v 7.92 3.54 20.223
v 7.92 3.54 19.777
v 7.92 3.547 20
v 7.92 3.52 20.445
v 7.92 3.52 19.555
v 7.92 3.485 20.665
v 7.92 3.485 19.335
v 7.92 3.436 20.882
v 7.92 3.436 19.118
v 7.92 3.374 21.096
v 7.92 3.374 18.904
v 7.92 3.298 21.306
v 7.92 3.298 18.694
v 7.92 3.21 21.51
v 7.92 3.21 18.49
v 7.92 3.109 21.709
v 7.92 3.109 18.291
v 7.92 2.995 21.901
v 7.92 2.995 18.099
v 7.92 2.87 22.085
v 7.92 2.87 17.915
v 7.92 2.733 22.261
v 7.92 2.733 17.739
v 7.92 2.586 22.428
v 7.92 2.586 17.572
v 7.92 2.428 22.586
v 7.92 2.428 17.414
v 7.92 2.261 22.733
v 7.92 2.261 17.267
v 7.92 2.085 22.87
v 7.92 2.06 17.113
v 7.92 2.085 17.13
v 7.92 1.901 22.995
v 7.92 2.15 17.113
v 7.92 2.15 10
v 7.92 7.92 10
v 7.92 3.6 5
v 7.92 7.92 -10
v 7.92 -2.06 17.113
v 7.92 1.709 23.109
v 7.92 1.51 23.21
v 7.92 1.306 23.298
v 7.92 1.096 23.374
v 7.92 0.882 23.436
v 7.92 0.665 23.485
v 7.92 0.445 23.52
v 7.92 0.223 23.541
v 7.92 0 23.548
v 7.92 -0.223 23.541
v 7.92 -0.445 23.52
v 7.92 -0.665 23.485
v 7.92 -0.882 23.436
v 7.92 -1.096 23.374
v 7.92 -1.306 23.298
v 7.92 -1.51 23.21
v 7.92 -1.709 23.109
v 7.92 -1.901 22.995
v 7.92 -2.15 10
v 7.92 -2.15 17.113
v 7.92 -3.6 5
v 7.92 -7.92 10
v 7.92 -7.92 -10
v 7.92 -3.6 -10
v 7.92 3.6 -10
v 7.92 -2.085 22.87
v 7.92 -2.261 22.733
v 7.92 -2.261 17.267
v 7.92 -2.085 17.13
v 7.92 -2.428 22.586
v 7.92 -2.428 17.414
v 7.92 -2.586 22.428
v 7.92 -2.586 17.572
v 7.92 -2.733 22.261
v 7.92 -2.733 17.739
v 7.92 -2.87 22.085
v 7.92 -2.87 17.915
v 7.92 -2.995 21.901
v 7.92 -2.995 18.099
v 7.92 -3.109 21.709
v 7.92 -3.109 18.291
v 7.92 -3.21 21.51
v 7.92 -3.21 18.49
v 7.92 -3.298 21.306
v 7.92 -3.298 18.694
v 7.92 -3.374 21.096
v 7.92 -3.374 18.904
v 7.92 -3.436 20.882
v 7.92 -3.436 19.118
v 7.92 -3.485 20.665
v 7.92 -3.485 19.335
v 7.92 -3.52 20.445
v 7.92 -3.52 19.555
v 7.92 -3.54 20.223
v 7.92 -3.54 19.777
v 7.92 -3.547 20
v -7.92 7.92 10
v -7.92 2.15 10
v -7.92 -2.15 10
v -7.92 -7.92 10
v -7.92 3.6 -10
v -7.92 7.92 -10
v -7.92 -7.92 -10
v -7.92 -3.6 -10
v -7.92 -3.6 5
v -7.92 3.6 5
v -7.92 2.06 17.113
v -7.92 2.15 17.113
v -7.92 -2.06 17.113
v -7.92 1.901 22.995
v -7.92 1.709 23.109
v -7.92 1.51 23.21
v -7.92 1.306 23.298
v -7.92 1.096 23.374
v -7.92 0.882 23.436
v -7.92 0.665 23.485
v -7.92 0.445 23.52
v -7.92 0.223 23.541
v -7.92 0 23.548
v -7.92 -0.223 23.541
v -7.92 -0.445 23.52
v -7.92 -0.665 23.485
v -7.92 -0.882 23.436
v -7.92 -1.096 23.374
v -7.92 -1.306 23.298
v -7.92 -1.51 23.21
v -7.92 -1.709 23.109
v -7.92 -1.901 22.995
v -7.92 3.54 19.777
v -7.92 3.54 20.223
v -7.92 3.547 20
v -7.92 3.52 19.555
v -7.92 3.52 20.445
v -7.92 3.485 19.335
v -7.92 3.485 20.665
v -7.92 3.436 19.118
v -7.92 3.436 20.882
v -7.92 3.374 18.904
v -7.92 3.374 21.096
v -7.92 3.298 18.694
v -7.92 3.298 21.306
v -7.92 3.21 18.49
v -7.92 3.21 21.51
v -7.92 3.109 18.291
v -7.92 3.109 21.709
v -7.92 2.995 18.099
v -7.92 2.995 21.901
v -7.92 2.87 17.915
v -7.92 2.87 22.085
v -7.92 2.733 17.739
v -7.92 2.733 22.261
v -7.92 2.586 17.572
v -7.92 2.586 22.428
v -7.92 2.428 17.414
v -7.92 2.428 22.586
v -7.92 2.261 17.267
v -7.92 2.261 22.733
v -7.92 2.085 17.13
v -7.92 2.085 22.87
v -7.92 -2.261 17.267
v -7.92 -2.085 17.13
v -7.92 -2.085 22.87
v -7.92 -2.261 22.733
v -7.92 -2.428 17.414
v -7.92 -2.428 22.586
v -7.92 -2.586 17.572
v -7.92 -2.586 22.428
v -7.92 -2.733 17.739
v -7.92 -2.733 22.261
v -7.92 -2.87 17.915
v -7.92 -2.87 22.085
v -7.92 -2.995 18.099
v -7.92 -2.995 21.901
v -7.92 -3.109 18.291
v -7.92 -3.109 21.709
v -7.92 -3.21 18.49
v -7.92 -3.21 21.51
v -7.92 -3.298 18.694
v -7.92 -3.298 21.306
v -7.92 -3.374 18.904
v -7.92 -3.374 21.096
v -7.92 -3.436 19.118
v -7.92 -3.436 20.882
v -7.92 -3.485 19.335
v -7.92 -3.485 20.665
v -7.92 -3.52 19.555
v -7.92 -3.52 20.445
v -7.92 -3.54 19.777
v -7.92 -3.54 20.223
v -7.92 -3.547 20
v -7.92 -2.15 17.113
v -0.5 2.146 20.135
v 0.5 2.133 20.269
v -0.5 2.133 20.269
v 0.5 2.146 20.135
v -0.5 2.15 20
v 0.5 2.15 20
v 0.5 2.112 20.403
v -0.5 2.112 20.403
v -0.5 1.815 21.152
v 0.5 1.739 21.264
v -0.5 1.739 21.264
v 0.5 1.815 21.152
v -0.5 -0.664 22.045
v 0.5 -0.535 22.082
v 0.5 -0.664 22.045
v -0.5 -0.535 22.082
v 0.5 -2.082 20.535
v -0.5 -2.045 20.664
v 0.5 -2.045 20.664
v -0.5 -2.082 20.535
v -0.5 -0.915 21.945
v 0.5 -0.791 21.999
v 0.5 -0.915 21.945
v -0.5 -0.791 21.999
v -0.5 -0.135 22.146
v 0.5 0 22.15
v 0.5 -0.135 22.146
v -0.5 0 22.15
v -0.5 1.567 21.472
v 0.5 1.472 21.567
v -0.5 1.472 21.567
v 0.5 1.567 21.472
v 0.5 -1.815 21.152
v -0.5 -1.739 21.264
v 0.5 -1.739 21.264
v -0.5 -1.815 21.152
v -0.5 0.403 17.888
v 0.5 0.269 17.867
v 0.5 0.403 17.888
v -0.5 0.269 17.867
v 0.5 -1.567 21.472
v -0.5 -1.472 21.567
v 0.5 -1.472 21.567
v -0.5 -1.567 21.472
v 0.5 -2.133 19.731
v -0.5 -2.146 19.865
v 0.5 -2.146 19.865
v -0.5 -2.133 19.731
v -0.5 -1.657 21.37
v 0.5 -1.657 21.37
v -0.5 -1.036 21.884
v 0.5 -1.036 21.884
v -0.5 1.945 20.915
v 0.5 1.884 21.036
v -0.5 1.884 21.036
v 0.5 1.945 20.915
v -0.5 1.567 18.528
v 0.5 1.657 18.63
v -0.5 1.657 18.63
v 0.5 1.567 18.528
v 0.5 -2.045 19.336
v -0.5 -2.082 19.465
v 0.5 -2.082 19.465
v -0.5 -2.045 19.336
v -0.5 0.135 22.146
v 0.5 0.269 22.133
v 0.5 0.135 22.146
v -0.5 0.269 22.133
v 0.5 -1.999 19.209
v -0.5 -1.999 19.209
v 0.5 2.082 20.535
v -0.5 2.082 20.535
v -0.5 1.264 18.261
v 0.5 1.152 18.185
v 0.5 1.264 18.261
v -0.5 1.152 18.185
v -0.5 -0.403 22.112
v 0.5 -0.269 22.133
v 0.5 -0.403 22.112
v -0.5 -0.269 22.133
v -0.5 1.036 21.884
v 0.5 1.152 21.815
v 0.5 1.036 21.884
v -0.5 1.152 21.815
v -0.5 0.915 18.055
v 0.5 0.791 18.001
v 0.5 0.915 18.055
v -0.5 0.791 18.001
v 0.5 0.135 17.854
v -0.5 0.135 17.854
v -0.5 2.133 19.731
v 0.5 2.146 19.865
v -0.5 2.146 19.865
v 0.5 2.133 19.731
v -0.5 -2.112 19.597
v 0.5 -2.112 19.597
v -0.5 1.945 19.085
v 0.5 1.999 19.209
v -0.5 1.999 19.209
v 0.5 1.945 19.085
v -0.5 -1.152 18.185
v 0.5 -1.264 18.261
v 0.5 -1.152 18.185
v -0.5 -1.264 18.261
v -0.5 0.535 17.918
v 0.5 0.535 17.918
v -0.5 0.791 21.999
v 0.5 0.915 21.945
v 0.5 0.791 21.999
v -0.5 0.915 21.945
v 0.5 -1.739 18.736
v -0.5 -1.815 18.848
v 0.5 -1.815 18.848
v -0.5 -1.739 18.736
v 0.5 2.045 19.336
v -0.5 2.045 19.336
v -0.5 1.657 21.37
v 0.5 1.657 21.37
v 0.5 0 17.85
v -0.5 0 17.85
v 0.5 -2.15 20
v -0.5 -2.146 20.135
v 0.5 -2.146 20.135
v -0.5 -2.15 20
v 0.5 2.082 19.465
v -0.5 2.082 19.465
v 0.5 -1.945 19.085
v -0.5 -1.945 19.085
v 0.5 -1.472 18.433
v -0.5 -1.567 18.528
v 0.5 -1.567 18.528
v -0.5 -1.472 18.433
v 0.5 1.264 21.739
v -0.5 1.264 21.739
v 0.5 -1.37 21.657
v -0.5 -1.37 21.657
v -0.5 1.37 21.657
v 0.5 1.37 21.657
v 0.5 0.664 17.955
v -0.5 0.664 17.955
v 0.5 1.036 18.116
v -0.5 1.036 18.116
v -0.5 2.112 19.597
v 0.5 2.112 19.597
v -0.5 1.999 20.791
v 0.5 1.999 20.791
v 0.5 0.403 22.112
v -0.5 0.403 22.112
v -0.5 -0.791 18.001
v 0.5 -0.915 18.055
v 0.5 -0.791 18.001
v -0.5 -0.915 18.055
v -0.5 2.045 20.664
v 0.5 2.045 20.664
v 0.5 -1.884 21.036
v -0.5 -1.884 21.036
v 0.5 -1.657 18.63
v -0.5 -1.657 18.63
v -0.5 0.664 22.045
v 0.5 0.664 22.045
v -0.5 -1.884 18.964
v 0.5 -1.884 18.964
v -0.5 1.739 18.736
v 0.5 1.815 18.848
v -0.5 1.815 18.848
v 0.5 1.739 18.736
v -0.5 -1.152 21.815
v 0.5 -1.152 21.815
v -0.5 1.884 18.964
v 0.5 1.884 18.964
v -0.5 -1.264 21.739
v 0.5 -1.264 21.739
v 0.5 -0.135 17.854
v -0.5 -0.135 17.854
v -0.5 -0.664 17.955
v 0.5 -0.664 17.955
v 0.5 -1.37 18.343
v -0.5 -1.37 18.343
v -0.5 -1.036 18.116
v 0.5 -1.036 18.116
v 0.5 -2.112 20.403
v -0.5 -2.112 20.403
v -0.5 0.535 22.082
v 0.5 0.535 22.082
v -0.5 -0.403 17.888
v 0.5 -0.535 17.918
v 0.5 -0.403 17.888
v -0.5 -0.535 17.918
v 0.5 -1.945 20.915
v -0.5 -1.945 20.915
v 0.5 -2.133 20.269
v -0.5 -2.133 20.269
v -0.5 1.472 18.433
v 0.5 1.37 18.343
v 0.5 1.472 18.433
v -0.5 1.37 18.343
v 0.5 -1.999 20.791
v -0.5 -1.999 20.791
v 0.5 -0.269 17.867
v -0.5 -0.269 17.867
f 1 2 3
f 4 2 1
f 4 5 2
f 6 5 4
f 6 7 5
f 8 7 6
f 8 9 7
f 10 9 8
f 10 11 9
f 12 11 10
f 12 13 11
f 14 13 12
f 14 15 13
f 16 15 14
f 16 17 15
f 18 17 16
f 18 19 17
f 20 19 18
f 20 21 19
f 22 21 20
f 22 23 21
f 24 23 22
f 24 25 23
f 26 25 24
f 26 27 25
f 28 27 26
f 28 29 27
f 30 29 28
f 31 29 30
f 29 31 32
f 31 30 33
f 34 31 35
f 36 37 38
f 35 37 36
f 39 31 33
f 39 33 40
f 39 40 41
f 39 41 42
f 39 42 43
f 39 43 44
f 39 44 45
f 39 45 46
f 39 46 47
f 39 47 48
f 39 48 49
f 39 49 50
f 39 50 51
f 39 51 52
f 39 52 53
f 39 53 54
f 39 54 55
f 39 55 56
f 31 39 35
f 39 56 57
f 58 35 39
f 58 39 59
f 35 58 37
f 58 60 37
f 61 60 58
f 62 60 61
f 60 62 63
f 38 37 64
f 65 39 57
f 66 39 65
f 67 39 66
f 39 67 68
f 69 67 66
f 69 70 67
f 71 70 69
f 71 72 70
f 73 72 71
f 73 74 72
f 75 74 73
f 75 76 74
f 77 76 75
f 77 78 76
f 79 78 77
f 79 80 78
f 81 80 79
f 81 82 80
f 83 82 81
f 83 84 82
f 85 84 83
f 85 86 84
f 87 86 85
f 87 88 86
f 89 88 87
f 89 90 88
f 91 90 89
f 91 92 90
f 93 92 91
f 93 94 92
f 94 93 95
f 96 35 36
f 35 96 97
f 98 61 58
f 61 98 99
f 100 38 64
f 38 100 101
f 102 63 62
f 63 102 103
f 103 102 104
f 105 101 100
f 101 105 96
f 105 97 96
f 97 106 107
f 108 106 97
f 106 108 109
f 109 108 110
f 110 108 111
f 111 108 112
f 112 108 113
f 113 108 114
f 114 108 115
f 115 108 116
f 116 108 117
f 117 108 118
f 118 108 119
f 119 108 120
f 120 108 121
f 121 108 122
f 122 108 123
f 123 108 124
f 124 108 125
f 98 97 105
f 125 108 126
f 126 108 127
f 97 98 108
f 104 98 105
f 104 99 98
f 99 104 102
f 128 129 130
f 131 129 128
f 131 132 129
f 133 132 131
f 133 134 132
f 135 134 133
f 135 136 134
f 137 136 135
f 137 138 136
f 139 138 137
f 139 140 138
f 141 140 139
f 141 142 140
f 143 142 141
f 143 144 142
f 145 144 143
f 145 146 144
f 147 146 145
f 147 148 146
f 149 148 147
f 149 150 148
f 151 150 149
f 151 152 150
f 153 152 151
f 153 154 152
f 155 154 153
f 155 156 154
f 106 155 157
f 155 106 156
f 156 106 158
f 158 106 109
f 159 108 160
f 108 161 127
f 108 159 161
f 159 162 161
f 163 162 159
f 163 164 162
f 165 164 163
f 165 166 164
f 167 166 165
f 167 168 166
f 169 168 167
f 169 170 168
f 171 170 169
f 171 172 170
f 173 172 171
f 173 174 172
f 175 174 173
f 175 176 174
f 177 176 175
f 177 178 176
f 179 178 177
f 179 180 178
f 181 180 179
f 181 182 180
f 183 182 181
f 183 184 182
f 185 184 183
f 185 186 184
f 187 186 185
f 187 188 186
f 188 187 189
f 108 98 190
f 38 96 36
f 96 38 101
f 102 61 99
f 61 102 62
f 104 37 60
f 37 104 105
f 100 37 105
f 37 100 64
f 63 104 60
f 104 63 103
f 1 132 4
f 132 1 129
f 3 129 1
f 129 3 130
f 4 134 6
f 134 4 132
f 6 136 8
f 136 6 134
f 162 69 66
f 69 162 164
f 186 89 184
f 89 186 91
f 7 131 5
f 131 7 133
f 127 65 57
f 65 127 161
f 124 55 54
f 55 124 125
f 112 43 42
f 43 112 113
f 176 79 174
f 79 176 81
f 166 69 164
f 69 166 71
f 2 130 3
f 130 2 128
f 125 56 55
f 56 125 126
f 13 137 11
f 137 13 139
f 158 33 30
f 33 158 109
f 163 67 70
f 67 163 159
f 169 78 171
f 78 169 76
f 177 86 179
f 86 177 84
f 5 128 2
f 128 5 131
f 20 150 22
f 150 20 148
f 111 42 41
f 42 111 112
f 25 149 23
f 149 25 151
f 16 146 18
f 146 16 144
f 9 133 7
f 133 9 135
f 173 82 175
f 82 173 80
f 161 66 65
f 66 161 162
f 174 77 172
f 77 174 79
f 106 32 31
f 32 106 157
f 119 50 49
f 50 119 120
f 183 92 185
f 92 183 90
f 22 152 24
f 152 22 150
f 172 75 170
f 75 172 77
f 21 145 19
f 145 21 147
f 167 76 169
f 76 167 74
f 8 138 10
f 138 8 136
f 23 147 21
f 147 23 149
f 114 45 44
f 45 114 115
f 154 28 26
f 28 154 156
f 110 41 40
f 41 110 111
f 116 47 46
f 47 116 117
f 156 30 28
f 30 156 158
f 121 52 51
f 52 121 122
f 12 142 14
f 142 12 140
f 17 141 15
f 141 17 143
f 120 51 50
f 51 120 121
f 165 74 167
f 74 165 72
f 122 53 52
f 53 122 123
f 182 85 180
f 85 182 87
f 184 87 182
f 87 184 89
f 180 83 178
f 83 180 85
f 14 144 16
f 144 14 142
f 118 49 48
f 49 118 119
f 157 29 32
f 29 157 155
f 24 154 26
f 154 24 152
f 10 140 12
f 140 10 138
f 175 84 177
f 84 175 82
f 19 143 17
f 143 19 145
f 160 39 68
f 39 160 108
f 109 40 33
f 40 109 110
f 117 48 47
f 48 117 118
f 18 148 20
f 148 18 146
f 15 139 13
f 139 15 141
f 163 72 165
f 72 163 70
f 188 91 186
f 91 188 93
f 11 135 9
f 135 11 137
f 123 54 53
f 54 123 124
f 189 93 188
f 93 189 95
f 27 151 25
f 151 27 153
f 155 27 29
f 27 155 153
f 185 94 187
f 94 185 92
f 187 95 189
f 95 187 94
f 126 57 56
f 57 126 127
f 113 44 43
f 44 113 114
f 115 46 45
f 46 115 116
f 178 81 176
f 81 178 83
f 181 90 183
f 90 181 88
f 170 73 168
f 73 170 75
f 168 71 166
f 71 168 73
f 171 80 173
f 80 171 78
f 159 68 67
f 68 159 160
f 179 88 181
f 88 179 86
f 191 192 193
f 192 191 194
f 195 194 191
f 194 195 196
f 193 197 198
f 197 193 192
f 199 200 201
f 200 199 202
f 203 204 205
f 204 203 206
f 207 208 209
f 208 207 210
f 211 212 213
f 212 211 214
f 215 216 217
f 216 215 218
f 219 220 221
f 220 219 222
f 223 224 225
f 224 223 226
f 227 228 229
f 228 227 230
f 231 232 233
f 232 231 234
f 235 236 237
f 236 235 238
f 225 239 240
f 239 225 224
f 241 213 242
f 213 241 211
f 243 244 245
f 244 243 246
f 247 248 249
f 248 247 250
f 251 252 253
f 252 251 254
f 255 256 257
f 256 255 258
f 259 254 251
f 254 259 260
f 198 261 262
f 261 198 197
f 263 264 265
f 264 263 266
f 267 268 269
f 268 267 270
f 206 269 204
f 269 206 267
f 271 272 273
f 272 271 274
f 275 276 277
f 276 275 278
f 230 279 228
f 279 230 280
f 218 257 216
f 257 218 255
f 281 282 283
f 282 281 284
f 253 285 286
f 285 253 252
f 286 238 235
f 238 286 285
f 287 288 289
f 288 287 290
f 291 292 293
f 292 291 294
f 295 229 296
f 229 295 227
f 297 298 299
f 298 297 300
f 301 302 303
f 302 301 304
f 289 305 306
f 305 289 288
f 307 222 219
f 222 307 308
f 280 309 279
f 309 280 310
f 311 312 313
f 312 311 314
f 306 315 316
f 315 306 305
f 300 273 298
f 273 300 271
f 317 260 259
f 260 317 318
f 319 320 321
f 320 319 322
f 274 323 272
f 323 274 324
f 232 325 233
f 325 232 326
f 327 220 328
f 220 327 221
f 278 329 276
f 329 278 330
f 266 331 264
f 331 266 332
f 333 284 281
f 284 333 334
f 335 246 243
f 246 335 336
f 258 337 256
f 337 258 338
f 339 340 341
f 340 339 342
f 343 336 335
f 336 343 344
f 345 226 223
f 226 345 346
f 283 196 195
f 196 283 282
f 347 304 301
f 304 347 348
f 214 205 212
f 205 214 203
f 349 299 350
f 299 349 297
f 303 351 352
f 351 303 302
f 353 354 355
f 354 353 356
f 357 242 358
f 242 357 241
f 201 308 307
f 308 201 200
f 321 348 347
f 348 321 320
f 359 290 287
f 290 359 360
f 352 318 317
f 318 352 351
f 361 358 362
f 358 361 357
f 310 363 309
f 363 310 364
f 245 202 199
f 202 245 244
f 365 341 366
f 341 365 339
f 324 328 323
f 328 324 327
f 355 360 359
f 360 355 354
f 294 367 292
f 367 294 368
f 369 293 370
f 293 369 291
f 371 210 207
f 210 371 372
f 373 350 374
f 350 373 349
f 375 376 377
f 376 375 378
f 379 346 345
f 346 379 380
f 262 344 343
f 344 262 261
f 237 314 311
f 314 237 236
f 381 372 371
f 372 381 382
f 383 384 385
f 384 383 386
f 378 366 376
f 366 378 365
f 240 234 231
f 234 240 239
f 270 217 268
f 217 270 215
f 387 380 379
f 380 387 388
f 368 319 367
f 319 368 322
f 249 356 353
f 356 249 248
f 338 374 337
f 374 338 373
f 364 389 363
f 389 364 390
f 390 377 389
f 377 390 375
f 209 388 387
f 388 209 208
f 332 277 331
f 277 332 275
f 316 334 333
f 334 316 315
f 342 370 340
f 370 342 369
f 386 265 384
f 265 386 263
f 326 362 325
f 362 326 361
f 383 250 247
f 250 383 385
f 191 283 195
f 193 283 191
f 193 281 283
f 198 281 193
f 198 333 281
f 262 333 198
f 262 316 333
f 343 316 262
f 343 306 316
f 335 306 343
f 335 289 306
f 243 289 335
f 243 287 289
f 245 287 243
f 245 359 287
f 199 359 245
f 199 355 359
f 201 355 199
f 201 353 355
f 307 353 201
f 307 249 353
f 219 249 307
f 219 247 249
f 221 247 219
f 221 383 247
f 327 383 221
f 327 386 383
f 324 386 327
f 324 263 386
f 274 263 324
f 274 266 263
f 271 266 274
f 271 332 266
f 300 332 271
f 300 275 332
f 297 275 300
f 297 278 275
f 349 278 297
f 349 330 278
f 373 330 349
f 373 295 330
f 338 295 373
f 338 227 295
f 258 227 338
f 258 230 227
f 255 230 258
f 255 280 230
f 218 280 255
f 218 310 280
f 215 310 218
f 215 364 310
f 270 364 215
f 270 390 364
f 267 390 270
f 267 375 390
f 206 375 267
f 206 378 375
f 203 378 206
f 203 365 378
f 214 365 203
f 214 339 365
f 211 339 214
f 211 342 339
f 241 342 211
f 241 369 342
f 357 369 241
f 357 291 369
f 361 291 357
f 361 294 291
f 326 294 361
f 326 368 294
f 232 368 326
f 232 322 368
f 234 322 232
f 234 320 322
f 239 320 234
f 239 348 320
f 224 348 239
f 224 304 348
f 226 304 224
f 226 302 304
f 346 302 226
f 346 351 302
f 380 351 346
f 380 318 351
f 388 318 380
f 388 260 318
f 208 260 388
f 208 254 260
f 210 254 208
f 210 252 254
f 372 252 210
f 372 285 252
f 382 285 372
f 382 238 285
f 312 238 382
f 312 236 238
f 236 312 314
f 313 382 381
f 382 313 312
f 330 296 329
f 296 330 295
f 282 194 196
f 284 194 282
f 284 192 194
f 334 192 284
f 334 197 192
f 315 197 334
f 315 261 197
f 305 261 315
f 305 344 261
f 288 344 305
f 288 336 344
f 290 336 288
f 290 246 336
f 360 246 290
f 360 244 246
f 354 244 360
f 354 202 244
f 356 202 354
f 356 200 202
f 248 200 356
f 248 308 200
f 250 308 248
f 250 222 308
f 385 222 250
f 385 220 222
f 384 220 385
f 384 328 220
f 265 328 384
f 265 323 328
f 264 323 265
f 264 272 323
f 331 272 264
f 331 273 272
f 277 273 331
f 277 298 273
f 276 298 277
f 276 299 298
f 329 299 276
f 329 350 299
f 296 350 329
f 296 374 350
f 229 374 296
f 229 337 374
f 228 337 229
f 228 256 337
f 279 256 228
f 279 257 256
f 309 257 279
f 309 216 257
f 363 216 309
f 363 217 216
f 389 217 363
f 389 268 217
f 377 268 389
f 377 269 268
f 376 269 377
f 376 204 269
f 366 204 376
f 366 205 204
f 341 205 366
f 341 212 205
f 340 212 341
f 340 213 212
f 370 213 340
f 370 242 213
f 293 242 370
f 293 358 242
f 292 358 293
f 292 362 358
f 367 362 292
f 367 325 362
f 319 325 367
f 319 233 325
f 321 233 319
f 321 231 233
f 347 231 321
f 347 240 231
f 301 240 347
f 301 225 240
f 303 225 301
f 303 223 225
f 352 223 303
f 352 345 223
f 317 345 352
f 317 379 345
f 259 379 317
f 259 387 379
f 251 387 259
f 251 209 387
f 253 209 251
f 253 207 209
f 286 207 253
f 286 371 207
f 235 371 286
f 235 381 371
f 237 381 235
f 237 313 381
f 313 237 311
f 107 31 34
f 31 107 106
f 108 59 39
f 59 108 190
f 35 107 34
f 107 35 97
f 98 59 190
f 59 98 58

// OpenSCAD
// Prusa i3 filament guide

clipHeight = 20;
filamentHoleDiam = 4.3;

module filamentGuide(frameThickness = 7.2){
    width = frameThickness*2.2;
    
    union(){
        difference(){
            cube([width,width,clipHeight],center=true);
            translate([0,0,-5]) cube([width*1.01,frameThickness,clipHeight],center=true);
        }
        translate([0,0,clipHeight]) rotate([90,0,90]) difference(){
            cylinder(d=filamentHoleDiam*1.65,h=width,$fn=100,center=true);
            cylinder(d=filamentHoleDiam,sh=width*1.02,$fn=100,center=true);
        }
        translate([0,0,clipHeight*0.65]) cube([width,filamentHoleDiam,clipHeight/2-(filamentHoleDiam*1.65)*0.25],center=true);
    }
}

filamentGuide();
